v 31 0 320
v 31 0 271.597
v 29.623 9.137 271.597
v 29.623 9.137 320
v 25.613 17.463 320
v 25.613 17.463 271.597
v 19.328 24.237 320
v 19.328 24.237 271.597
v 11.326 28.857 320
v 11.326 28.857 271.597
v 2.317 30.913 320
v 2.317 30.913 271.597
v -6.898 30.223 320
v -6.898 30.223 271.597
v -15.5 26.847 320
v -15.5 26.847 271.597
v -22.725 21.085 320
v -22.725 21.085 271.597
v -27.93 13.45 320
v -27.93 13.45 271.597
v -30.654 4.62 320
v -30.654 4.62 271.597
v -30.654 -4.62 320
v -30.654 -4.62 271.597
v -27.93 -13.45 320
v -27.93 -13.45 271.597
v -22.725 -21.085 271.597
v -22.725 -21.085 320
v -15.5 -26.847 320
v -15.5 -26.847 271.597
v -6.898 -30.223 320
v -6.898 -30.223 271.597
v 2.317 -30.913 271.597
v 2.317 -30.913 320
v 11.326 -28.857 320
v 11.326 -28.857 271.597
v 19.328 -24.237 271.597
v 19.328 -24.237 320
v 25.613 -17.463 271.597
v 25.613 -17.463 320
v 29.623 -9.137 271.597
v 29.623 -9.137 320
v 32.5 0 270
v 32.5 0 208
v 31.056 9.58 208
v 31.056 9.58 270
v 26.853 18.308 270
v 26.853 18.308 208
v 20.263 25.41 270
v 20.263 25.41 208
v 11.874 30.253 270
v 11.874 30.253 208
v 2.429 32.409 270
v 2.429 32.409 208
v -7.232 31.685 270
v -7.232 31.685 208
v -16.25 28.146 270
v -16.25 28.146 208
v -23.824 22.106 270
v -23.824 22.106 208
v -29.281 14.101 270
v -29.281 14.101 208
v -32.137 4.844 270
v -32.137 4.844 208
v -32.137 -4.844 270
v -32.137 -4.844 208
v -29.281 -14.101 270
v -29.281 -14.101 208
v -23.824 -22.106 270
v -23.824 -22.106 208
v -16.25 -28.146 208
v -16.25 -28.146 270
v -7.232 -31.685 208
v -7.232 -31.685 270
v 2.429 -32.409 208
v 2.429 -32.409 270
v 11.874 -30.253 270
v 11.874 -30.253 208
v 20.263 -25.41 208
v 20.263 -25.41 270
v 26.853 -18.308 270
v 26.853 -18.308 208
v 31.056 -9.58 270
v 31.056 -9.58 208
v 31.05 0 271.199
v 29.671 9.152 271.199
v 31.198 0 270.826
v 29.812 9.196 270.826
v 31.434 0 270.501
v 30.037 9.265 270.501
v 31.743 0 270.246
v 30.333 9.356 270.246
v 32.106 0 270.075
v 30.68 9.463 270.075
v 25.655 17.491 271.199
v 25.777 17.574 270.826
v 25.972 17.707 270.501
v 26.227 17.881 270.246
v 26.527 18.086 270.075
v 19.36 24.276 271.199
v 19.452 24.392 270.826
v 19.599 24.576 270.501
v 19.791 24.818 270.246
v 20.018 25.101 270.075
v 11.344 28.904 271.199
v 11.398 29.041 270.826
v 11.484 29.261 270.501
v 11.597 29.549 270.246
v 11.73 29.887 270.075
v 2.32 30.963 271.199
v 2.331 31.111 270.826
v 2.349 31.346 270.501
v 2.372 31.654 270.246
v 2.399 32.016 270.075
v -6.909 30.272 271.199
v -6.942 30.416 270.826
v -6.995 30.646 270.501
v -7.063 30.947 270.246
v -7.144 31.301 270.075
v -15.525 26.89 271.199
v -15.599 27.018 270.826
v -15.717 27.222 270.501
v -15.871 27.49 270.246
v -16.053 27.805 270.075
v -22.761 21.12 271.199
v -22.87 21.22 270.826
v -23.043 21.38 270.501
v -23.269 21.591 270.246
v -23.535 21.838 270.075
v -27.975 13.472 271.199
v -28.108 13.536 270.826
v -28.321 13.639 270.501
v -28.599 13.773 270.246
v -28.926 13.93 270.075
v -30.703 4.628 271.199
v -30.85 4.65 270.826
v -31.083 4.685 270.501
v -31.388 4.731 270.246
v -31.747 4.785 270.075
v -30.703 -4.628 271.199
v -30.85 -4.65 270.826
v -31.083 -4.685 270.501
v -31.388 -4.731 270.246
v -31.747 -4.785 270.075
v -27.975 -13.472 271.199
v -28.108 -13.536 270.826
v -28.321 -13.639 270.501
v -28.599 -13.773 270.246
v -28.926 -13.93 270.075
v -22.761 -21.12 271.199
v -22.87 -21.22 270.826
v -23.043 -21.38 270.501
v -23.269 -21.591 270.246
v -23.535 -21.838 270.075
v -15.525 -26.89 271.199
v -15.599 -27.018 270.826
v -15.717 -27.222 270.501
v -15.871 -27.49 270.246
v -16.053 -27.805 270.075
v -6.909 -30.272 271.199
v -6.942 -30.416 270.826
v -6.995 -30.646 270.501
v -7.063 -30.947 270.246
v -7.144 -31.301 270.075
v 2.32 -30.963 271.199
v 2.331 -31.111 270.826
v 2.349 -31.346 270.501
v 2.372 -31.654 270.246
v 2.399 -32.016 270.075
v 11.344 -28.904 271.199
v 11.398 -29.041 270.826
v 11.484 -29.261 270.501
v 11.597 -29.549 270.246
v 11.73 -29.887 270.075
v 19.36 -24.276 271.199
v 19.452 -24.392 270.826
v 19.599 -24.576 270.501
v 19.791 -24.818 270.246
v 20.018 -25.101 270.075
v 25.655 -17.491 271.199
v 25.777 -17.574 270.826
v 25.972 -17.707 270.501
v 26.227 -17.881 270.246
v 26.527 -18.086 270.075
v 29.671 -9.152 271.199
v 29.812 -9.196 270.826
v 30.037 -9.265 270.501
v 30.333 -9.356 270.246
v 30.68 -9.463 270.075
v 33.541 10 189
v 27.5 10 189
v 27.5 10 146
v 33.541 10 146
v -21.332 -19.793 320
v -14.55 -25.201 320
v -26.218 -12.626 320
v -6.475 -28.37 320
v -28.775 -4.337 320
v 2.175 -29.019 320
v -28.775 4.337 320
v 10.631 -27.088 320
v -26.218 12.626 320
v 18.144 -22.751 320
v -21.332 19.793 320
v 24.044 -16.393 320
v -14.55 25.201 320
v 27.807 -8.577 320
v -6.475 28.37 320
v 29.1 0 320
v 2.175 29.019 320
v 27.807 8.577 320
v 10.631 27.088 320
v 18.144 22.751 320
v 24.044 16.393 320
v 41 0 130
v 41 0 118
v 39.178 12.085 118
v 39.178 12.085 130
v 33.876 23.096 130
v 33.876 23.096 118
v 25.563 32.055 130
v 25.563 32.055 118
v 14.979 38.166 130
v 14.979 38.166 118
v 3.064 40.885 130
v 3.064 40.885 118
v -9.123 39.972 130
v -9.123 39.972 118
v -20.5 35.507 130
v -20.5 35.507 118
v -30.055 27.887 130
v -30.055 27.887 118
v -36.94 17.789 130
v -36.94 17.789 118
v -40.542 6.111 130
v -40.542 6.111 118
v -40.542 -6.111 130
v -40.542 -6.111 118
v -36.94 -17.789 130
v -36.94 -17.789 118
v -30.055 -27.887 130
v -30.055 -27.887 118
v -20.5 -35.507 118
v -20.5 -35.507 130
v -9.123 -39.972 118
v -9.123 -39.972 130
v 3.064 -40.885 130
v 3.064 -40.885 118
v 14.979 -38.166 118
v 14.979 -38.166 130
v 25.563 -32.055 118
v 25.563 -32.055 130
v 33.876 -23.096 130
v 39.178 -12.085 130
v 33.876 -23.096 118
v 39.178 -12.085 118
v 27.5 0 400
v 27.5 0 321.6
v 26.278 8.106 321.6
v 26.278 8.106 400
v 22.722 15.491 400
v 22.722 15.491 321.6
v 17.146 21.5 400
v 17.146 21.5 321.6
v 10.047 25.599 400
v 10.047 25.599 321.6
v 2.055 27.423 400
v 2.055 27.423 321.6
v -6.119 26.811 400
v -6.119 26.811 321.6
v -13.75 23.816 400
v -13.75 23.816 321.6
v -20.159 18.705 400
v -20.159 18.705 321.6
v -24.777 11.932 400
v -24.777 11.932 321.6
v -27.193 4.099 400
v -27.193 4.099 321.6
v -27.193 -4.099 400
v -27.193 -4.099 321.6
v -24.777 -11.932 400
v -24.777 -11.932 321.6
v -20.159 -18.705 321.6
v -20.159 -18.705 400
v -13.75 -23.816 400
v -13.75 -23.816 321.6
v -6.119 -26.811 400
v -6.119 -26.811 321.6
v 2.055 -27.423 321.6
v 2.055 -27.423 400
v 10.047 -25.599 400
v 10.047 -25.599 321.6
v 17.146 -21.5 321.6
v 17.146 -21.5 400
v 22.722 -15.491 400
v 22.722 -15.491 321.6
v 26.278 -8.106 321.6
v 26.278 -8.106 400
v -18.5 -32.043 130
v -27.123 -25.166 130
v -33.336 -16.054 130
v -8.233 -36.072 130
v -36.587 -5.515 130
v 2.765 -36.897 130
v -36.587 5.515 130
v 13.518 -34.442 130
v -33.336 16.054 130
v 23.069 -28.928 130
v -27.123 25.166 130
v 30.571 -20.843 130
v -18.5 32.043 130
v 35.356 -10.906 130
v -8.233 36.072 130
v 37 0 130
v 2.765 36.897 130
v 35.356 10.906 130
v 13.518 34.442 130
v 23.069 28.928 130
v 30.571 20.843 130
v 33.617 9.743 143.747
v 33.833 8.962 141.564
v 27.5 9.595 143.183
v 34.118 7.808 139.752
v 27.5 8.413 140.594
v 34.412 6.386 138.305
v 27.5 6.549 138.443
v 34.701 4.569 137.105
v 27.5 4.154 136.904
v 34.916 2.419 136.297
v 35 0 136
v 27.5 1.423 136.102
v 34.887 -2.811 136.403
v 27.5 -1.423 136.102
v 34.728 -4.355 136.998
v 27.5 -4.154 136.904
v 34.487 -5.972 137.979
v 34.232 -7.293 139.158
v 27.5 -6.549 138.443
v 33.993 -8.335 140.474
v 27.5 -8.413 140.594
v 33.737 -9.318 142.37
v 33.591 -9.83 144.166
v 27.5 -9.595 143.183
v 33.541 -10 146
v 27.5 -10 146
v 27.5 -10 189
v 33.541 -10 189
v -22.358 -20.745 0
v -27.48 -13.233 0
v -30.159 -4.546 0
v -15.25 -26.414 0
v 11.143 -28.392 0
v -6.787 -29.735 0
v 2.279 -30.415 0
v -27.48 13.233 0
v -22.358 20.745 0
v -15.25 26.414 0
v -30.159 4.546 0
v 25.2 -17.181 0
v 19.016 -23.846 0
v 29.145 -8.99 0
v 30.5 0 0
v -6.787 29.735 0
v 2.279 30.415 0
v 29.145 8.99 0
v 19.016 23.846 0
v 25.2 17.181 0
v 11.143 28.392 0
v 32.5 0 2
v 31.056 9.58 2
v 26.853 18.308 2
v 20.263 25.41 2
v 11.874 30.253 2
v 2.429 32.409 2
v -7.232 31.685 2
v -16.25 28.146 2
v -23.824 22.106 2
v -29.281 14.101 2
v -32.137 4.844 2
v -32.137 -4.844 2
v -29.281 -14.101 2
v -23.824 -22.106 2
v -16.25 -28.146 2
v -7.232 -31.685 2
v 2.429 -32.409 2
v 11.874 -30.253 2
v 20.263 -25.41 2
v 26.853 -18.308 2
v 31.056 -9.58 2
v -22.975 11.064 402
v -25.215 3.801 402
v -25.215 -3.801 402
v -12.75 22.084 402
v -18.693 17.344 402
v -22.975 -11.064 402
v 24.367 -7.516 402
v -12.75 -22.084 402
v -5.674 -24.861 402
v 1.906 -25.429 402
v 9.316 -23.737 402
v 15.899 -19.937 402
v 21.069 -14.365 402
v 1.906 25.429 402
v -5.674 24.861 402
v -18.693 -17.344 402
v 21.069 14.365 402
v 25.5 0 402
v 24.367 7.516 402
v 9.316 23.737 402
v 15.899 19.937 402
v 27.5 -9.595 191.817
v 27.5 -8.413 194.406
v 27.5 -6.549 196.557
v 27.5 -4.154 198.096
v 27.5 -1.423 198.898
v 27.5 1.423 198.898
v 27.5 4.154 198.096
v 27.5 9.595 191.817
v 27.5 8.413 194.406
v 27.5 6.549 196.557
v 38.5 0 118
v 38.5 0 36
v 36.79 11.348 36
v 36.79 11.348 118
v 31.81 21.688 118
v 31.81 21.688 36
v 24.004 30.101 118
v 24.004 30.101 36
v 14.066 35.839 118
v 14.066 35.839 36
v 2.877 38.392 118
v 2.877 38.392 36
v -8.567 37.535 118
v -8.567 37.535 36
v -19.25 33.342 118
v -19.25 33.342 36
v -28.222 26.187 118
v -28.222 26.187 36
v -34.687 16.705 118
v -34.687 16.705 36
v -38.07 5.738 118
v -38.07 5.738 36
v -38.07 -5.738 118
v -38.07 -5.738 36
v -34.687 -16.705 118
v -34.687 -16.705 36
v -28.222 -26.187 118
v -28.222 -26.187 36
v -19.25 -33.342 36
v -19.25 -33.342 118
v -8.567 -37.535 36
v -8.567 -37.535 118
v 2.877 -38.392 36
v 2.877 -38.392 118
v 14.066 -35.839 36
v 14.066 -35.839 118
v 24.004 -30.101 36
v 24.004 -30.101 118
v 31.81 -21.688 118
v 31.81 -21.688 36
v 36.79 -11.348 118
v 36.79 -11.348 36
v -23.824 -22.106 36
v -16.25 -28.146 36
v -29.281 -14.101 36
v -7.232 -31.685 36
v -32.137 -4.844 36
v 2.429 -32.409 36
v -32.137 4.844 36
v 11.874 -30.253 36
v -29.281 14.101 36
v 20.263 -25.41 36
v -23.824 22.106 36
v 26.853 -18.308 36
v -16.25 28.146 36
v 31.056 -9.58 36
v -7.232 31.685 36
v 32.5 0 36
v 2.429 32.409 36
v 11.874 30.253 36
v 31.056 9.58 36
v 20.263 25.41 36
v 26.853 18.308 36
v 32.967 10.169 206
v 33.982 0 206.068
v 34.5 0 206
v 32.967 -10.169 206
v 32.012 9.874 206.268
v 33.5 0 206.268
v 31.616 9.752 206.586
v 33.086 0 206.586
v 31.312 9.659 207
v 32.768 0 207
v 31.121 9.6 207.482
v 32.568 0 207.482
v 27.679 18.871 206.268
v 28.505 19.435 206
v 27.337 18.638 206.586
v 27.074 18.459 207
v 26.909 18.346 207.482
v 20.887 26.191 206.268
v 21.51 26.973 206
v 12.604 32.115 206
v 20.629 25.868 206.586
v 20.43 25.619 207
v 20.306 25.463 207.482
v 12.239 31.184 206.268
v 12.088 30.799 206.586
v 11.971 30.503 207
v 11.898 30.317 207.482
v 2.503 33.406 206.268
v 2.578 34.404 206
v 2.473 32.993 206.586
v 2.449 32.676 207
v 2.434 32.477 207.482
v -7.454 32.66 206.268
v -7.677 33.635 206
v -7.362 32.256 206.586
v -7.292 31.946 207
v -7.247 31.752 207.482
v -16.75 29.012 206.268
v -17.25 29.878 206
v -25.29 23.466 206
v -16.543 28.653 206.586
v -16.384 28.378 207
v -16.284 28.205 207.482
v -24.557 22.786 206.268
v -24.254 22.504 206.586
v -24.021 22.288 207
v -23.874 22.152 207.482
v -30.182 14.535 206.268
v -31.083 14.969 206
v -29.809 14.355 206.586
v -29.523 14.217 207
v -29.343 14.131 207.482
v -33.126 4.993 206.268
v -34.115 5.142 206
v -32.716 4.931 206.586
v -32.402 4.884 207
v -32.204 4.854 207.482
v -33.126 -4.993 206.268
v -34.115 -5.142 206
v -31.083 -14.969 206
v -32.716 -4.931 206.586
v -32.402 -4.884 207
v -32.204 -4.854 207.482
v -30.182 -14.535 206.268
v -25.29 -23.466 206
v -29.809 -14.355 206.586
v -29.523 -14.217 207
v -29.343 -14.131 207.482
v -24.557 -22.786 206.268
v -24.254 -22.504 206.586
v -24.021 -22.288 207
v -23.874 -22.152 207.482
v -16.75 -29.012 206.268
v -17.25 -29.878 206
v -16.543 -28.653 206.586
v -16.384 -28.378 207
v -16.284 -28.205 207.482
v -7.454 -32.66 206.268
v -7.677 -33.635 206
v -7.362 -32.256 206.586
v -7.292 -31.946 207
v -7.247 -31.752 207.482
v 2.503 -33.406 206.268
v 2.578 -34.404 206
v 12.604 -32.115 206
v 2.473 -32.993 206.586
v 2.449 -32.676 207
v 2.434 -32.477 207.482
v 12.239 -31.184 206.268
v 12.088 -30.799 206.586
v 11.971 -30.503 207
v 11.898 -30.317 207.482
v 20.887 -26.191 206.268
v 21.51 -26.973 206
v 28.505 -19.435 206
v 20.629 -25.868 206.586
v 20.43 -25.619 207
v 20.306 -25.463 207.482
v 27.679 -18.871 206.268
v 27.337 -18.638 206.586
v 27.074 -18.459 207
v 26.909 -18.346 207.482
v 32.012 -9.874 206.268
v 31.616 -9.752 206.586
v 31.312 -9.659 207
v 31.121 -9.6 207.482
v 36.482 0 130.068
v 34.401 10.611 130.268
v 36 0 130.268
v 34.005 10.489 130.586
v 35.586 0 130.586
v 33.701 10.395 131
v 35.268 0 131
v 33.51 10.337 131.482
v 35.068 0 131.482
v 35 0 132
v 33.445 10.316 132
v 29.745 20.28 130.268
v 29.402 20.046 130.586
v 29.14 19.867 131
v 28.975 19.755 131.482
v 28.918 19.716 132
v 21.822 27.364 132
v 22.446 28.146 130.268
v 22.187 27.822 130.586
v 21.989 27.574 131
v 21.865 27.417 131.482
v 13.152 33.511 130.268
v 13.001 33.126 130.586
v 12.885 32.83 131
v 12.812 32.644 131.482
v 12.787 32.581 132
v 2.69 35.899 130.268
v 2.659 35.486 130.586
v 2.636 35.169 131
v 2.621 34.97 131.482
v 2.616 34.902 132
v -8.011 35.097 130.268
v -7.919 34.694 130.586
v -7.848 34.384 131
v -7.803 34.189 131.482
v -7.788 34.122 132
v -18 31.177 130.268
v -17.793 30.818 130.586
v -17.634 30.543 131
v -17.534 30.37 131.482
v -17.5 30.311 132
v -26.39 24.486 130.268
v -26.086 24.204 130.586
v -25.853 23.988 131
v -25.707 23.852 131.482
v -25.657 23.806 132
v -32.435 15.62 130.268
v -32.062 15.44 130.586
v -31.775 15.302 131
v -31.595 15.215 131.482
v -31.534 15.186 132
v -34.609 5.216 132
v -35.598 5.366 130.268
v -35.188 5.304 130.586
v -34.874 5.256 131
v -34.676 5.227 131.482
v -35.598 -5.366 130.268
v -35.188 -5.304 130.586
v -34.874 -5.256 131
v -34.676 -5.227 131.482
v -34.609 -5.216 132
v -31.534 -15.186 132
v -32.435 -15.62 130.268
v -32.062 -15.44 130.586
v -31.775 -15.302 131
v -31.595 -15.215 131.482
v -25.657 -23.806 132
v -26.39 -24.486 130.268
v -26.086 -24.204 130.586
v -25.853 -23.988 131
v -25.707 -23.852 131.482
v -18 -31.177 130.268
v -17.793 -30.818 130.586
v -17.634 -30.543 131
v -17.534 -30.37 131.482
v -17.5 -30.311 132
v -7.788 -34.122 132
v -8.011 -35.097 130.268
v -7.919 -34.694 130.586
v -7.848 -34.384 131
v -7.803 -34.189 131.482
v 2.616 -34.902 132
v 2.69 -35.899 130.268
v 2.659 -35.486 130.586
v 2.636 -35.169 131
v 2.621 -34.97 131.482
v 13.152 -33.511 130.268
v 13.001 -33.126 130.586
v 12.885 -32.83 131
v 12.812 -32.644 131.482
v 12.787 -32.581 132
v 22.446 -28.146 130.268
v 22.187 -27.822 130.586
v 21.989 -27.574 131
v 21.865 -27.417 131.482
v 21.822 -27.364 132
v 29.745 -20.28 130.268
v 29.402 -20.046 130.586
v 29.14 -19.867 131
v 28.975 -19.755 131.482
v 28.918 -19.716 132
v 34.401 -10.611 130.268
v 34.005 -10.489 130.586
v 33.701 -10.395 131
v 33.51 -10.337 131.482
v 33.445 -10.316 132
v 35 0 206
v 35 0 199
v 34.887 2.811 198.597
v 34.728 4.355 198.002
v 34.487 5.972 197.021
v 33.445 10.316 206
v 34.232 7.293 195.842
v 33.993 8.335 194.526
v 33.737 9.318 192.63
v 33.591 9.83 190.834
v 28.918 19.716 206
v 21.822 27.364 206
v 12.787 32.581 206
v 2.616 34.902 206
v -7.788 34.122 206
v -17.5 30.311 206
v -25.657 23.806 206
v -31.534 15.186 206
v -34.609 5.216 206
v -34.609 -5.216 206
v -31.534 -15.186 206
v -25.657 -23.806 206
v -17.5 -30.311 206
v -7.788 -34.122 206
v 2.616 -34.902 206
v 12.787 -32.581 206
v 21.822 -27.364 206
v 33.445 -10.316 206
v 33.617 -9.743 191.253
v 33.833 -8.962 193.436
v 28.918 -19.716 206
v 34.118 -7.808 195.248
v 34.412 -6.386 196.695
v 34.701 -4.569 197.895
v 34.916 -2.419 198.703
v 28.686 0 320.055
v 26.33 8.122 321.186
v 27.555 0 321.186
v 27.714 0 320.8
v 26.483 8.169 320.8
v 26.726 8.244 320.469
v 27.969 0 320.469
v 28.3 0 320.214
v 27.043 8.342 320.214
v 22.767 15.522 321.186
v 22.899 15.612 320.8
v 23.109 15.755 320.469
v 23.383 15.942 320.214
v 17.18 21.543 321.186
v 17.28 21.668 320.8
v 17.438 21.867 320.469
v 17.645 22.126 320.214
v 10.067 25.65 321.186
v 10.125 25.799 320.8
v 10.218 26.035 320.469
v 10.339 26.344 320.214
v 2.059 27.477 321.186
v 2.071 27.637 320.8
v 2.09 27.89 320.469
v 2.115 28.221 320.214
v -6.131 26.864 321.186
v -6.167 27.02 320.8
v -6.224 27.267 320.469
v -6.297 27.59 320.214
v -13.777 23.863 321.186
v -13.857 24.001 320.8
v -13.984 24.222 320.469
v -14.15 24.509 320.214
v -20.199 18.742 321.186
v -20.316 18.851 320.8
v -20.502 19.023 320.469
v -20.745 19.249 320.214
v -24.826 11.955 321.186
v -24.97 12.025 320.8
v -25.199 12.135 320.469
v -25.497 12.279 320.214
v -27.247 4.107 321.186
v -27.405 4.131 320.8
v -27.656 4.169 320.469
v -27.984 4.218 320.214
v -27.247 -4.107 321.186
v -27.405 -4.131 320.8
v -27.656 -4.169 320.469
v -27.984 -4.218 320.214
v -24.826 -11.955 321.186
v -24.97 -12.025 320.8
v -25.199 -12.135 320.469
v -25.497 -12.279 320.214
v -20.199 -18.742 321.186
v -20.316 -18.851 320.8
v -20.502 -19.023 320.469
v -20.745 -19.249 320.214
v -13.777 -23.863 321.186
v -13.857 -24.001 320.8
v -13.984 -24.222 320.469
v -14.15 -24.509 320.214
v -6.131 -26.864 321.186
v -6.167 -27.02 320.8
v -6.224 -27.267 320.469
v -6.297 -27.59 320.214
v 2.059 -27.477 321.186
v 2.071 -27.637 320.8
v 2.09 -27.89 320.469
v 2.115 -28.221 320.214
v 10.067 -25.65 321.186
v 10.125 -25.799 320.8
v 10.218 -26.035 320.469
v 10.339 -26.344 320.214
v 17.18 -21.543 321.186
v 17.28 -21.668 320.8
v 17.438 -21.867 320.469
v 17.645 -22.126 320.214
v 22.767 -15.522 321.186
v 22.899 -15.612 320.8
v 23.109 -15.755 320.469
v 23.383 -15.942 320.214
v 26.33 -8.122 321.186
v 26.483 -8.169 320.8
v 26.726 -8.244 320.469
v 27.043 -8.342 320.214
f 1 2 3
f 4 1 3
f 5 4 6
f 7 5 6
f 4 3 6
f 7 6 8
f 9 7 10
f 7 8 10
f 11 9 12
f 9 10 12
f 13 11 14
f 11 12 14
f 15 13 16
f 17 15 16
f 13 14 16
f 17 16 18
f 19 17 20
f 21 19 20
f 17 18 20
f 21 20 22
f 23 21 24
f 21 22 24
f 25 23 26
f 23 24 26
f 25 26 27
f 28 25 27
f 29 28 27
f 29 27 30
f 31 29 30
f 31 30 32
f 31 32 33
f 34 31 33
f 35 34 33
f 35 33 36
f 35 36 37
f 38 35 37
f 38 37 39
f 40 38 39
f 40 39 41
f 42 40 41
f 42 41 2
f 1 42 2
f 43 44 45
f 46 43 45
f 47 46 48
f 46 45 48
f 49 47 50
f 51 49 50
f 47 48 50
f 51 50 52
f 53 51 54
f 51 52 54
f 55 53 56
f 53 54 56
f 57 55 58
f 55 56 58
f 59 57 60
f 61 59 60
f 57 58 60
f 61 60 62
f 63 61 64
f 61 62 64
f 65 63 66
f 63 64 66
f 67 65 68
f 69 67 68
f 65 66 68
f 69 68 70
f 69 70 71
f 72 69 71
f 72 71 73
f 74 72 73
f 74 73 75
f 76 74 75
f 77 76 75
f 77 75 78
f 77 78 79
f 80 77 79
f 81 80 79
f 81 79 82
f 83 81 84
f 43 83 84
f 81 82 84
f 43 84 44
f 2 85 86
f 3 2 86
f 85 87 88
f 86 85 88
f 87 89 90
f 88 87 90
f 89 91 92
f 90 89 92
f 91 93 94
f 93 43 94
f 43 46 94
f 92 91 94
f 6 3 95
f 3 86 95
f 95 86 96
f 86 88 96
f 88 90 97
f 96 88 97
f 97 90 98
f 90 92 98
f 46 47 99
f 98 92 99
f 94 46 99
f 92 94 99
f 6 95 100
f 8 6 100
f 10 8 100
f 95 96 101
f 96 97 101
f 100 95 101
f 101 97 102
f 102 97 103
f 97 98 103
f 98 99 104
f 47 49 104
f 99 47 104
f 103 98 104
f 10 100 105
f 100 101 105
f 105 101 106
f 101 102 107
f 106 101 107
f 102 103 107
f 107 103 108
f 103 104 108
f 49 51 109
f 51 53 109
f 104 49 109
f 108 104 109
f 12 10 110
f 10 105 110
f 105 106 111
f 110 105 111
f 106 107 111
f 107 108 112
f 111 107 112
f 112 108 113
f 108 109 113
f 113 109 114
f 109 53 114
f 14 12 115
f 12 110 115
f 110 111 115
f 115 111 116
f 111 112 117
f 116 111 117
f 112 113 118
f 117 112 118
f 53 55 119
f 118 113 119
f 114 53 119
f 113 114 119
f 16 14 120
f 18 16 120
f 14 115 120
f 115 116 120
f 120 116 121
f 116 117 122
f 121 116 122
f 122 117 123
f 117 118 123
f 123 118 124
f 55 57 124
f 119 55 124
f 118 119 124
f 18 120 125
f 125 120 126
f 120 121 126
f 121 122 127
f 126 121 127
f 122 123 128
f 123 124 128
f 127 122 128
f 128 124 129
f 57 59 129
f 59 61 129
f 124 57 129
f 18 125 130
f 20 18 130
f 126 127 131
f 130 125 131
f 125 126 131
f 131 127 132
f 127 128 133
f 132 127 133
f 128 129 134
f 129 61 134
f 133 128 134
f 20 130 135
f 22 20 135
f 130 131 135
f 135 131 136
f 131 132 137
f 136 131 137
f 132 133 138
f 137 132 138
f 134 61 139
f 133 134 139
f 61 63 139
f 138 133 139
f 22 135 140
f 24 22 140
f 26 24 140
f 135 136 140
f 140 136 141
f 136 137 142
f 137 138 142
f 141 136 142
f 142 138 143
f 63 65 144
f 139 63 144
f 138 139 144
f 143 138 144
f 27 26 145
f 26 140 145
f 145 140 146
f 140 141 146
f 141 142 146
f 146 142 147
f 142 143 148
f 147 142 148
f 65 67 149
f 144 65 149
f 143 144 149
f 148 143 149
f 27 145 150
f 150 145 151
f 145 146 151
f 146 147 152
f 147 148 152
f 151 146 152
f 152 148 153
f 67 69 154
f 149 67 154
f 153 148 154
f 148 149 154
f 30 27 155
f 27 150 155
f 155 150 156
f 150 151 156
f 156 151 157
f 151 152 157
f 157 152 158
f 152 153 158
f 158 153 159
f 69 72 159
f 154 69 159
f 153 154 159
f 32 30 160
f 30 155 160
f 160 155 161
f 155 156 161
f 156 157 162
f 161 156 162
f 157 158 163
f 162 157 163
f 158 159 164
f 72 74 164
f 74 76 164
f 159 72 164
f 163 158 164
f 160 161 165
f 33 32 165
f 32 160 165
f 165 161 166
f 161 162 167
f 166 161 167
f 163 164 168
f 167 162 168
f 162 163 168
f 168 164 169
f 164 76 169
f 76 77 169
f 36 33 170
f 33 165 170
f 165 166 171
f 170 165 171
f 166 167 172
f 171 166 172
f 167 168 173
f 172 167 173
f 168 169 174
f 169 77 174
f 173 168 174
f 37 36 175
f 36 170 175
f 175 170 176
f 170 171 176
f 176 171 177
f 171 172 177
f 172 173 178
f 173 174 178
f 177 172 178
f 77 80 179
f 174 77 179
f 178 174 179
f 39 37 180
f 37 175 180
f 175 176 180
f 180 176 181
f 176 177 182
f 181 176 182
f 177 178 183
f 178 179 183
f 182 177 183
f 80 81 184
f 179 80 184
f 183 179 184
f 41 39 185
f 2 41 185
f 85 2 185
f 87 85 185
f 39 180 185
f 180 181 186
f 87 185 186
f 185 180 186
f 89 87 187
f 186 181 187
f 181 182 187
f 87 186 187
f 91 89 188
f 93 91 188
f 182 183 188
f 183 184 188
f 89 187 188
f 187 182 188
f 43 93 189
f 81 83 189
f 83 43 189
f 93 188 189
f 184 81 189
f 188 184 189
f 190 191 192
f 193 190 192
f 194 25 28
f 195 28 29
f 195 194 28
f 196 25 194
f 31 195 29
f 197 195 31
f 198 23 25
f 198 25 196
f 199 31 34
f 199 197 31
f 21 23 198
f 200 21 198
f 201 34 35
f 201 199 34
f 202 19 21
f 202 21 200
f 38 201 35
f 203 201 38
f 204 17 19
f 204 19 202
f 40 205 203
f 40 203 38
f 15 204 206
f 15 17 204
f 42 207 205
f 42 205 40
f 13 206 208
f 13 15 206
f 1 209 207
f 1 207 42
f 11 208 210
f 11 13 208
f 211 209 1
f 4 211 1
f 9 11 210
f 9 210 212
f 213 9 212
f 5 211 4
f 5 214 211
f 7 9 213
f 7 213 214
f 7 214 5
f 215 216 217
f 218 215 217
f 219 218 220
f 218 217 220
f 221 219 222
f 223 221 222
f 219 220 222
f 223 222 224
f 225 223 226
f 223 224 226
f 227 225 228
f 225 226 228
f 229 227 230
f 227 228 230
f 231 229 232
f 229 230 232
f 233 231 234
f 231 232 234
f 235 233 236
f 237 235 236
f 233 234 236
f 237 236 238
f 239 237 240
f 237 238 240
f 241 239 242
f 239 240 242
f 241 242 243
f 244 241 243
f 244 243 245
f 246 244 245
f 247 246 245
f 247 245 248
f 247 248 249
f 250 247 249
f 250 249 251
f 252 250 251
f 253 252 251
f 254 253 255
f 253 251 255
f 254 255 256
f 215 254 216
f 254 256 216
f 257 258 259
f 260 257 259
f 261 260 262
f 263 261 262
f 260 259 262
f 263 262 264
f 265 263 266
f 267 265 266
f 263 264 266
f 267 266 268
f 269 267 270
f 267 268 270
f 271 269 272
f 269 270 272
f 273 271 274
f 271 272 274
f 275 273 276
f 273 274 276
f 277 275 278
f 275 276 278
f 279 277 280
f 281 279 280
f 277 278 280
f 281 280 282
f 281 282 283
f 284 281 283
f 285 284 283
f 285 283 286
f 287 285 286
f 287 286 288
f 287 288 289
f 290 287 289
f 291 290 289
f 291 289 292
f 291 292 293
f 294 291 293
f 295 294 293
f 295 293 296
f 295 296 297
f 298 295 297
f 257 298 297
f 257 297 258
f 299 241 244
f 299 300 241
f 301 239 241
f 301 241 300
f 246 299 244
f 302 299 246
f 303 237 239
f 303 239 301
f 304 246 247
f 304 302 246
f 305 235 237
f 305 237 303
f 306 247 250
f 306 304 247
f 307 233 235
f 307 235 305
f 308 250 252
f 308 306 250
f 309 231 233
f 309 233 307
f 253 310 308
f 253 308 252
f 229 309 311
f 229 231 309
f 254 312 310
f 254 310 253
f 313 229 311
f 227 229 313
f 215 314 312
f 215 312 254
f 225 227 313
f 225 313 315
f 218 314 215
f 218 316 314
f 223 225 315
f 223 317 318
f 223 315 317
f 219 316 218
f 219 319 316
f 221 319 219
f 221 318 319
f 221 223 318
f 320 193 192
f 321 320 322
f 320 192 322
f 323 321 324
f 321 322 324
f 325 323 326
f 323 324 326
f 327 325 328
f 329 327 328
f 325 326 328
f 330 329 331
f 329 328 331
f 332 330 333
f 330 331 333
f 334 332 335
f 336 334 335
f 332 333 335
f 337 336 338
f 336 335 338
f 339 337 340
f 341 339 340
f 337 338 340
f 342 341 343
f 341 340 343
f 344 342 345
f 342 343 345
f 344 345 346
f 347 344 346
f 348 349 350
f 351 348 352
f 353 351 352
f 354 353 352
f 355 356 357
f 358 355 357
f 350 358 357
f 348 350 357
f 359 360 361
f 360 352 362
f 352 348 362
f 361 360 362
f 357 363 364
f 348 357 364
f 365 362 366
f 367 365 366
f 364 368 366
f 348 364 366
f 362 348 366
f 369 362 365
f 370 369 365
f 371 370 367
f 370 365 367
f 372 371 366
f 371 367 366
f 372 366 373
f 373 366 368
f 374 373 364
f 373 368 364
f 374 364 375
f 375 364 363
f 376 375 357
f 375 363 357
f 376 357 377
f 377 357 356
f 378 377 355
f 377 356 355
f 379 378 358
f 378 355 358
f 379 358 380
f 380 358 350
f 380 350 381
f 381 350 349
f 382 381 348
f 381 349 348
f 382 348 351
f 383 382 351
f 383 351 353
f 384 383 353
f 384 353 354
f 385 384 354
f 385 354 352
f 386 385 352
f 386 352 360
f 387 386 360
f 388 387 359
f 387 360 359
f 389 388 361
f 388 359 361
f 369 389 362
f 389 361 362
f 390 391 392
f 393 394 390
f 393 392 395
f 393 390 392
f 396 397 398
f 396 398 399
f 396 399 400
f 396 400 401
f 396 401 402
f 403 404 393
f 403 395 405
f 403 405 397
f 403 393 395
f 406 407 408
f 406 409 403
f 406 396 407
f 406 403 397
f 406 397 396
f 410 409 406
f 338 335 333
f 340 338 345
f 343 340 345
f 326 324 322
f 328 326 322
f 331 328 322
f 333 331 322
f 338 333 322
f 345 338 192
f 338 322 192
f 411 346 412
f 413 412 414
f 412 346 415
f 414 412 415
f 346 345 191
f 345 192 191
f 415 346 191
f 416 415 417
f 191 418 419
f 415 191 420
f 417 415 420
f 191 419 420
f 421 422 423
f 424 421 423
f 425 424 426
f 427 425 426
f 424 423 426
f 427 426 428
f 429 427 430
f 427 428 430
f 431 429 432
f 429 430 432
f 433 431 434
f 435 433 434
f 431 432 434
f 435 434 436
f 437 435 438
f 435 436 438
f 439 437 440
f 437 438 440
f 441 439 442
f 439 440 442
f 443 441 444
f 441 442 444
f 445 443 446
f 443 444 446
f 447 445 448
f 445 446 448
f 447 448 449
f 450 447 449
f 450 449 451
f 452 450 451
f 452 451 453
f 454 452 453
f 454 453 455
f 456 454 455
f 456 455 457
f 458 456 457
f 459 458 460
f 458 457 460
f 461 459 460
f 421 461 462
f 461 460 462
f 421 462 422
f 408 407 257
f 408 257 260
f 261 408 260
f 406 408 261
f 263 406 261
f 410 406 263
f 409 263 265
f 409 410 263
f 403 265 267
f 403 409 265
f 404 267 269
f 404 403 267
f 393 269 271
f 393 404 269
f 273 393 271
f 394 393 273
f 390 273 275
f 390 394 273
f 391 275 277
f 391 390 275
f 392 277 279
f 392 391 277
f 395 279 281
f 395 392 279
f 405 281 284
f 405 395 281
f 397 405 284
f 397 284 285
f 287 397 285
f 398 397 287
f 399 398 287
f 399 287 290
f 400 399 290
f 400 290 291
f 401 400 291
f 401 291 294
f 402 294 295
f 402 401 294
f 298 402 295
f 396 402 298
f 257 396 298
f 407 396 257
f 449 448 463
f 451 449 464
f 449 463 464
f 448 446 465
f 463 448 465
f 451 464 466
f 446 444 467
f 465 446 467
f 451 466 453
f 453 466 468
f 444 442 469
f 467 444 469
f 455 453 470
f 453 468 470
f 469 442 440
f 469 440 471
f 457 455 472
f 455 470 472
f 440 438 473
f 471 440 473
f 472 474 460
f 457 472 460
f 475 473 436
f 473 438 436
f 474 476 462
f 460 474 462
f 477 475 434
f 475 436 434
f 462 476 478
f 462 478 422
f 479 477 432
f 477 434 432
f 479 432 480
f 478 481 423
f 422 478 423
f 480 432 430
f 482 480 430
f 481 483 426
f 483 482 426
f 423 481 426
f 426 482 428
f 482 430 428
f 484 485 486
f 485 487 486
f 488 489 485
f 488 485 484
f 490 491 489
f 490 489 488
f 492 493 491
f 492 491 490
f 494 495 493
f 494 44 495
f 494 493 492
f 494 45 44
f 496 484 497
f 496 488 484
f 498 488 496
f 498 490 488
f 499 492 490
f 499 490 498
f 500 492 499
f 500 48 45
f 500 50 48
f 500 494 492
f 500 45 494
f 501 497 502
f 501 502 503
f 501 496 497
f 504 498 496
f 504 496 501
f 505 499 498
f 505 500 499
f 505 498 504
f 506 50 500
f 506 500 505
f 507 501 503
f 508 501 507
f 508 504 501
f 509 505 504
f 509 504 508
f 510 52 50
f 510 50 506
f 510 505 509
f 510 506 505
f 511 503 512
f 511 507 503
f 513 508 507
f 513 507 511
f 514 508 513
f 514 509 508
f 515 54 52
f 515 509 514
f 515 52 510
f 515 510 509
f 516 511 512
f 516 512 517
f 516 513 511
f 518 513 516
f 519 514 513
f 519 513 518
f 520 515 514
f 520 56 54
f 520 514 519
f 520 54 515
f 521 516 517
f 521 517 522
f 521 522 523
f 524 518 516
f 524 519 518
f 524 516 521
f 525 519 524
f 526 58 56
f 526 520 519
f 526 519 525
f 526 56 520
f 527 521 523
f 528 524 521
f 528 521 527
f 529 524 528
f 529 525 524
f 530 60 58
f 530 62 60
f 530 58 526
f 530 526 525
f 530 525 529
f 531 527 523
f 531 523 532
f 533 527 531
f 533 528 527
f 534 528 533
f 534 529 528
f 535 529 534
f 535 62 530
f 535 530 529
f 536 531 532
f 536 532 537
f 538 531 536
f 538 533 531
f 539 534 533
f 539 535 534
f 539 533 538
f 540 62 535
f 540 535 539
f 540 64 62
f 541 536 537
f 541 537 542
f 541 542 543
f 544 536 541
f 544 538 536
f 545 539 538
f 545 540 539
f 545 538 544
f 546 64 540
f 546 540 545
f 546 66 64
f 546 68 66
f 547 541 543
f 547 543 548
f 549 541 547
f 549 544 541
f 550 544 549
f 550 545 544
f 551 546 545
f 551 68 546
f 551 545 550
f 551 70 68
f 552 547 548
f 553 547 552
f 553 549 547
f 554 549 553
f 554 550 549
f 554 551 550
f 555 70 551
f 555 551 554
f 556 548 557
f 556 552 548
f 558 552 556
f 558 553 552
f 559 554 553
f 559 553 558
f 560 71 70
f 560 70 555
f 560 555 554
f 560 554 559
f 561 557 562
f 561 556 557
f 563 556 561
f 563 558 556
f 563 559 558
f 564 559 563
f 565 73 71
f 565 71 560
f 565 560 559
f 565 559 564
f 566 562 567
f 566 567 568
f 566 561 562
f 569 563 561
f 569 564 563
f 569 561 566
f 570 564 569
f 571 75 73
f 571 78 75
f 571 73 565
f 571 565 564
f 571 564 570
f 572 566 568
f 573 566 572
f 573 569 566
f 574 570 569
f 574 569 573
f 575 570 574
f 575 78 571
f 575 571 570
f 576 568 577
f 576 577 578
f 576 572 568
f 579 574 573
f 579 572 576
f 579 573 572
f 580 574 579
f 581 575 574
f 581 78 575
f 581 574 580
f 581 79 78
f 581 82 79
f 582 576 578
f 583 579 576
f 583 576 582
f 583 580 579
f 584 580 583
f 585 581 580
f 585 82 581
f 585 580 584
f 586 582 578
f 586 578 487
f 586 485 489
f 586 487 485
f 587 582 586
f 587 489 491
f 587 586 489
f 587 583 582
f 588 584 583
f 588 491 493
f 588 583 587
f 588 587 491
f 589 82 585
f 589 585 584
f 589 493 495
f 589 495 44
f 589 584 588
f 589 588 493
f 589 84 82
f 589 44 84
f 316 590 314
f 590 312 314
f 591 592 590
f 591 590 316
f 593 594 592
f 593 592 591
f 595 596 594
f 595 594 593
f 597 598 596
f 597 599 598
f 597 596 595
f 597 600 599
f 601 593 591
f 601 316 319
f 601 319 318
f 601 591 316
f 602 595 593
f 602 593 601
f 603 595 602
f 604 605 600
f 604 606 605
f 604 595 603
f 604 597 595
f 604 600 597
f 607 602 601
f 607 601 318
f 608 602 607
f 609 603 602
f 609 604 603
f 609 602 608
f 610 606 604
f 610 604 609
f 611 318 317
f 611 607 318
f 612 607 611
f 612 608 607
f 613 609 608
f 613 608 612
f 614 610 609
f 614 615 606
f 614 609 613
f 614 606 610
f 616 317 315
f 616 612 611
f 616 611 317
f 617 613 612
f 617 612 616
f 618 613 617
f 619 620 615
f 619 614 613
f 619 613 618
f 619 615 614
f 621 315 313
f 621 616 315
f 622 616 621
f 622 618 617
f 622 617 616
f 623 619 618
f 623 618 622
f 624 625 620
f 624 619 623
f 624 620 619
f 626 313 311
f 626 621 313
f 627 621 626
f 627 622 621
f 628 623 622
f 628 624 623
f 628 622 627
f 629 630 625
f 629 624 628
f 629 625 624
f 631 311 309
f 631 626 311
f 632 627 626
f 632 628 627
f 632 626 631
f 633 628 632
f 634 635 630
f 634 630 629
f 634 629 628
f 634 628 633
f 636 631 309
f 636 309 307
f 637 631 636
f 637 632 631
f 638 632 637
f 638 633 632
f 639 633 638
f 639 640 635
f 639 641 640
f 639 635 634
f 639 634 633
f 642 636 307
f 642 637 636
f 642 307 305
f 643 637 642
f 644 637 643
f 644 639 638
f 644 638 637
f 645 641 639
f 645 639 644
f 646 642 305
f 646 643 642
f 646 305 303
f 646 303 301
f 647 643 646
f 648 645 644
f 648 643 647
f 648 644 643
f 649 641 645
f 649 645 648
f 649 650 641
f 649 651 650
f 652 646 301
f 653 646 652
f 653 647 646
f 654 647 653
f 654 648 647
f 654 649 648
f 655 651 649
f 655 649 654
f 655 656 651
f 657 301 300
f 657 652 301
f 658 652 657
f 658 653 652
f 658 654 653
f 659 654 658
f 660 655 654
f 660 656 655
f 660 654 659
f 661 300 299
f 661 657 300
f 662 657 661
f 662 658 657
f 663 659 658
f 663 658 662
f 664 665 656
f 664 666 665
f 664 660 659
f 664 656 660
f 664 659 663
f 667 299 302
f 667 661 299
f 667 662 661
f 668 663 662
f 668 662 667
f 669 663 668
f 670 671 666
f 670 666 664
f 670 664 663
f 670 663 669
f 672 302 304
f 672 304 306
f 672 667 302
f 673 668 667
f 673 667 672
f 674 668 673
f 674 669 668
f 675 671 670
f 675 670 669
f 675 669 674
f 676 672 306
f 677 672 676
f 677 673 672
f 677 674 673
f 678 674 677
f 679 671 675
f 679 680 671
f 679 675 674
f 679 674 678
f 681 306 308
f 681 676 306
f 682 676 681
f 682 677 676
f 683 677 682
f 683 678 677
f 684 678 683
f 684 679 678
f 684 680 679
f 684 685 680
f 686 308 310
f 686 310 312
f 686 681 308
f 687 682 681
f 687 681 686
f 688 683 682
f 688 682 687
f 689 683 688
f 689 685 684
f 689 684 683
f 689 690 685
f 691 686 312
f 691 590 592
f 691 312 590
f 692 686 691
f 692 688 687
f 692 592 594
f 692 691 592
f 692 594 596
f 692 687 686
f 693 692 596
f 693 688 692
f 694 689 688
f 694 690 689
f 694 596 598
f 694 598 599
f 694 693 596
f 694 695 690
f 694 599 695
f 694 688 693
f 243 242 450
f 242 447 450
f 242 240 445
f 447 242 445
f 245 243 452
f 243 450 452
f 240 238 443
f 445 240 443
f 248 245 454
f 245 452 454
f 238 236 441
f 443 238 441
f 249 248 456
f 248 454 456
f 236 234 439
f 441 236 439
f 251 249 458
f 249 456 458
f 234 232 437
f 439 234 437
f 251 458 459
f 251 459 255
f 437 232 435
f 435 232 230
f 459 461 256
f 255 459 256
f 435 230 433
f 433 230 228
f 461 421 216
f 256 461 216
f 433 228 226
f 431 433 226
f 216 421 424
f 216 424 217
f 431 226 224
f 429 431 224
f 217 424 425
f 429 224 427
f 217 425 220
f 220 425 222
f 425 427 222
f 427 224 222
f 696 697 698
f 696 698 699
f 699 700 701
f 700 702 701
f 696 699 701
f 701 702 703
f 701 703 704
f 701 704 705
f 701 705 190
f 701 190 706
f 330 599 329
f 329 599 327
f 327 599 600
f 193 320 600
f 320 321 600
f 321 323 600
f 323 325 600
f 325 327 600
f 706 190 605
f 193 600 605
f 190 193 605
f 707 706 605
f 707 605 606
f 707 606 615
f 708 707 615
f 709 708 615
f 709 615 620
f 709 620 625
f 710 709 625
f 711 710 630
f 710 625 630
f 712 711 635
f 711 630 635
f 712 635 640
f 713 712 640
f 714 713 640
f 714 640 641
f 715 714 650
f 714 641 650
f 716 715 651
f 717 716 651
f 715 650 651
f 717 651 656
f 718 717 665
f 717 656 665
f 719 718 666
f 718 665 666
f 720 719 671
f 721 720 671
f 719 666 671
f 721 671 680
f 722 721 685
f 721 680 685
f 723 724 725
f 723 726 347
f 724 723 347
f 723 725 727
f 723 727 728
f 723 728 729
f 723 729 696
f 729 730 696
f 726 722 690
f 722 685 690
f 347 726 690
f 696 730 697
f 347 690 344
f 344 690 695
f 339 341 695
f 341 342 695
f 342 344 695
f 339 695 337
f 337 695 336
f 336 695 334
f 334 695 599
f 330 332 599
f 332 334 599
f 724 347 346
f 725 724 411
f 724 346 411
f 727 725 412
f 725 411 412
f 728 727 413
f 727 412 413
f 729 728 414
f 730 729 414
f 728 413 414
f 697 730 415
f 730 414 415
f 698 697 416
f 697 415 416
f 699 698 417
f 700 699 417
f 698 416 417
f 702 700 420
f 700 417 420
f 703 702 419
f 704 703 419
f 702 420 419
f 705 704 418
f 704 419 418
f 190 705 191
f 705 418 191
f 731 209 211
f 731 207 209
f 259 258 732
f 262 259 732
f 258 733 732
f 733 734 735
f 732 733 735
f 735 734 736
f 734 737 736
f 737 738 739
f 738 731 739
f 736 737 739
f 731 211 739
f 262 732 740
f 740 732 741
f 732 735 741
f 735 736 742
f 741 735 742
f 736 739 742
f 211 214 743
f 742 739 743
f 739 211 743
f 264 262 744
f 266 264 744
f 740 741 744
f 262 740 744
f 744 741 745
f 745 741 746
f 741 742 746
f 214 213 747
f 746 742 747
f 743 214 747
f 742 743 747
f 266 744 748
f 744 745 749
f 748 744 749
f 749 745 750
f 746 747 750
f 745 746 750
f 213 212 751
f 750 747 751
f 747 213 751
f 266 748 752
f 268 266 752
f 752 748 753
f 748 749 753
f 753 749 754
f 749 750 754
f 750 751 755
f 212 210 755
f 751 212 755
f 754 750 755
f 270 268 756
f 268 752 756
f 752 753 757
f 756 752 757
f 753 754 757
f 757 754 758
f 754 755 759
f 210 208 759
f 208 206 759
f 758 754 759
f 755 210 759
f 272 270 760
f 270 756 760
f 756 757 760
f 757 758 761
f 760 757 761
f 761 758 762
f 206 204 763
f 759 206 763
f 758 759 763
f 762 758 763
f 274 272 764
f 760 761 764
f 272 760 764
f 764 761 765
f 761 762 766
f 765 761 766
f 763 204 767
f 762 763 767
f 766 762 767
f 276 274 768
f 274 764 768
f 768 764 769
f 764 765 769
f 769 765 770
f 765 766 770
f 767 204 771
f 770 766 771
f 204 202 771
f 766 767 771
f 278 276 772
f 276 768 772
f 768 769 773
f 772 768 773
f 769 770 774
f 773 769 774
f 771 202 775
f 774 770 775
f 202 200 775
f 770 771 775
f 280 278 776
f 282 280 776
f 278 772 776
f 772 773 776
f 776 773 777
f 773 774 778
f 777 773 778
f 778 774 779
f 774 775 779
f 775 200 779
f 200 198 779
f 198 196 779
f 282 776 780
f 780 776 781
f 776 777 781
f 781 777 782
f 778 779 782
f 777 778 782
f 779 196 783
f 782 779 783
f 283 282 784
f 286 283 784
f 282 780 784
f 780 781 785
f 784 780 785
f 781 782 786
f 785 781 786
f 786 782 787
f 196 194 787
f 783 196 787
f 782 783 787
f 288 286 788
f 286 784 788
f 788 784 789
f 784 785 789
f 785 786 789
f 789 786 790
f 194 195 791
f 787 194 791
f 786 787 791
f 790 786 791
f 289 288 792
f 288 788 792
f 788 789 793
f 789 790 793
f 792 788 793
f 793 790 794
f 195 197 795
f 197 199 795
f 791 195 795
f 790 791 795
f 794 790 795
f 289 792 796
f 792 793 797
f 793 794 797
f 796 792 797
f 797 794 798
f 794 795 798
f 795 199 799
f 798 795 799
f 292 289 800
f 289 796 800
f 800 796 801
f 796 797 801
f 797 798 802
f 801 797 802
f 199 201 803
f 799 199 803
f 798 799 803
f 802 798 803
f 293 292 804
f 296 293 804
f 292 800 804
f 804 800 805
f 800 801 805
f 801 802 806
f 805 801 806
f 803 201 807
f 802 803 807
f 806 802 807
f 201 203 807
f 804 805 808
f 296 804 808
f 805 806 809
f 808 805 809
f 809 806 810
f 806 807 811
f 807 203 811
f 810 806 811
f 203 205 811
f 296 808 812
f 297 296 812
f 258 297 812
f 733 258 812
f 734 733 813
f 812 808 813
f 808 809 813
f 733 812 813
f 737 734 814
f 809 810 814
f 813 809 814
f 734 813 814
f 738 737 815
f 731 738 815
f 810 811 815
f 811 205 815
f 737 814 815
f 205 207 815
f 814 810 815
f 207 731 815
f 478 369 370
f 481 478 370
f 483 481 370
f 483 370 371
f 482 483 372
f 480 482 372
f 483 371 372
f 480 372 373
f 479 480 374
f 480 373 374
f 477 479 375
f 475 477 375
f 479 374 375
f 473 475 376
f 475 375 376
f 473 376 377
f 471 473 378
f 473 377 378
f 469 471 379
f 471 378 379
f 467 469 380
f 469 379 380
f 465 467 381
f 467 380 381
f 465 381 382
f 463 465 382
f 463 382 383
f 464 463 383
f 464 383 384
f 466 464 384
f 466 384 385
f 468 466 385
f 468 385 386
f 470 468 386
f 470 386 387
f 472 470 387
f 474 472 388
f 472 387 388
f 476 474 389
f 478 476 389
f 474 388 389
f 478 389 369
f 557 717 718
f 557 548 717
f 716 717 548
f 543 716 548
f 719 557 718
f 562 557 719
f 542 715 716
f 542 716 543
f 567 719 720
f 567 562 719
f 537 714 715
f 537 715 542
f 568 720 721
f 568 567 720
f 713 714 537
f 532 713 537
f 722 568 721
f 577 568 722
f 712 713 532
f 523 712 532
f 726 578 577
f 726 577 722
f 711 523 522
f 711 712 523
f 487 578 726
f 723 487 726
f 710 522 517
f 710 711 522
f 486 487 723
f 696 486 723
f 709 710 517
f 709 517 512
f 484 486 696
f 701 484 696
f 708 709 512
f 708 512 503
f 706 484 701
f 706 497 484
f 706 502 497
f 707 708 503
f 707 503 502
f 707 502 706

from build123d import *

# Parameters (mm, degrees)
SKETCH_1_R          = 32.5
EXTRUDE_1_DEPTH     = 36
SKETCH_2_R          = 38.5
EXTRUDE_2_DEPTH     = 82
SKETCH_3_R          = 41
EXTRUDE_3_DEPTH     = 12
SKETCH_4_R          = 35
EXTRUDE_4_DEPTH     = 76
SKETCH_5_R          = 32.5
EXTRUDE_5_DEPTH     = 64
SKETCH_6_R          = 31
EXTRUDE_6_DEPTH     = 50
SKETCH_7_R          = 27.5
EXTRUDE_7_DEPTH     = 82
FILLET_1_R          = 2
FILLET_2_R          = 1.6
CHAMFER_1_SIZE      = 2
CUT_EXTRUDE_1_DEPTH = 29


with BuildPart() as part:
    # 草图1 → 凸台-拉伸1 (new body)
    with BuildSketch(Plane.XY):
        Circle(SKETCH_1_R)
    extrude(amount=EXTRUDE_1_DEPTH)

    # 草图2 → 凸台-拉伸2 (add)
    with BuildSketch(Plane.XY.offset(36)):
        Circle(SKETCH_2_R)
    extrude(amount=EXTRUDE_2_DEPTH)

    # 草图3 → 凸台-拉伸3 (add)
    with BuildSketch(Plane.XY.offset(118)):
        Circle(SKETCH_3_R)
    extrude(amount=EXTRUDE_3_DEPTH)

    # 草图4 → 凸台-拉伸4 (add)
    with BuildSketch(Plane.XY.offset(130)):
        Circle(SKETCH_4_R)
    extrude(amount=EXTRUDE_4_DEPTH)

    # 草图5 → 凸台-拉伸5 (add)
    with BuildSketch(Plane.XY.offset(206)):
        Circle(SKETCH_5_R)
    extrude(amount=EXTRUDE_5_DEPTH)

    # 草图6 → 凸台-拉伸6 (add)
    with BuildSketch(Plane.XY.offset(270)):
        Circle(SKETCH_6_R)
    extrude(amount=EXTRUDE_6_DEPTH)

    # 草图7 → 凸台-拉伸7 (add)
    with BuildSketch(Plane.XY.offset(320)):
        Circle(SKETCH_7_R)
    extrude(amount=EXTRUDE_7_DEPTH)

    # 圆角1
    fillet_1_edges = [part.edges().sort_by_distance(p)[0] for p in [
        (-35, 0, 130),
        (-32.5, 0, 206),
    ]]
    fillet(fillet_1_edges, radius=FILLET_1_R)

    # 圆角2
    # the kernel refuses this fillet: 1.6 mm, written as the material it adds along each edge
    with BuildSketch(Plane(origin=(0, 0, 270), x_dir=(1, 0, 0), z_dir=(0, -1, 0))) as fillet_2_piece_1:
        with BuildLine():
            CenterArc((32.6, 1.596871942), FILLET_2_R, 180, 86.416678302)
            Line((31, 1.596871942), (30.968, 1.596871942))
            Line((30.968, 1.596871942), (30.968, 0))
            Line((30.968, 0), (31, -0.032))
            ThreePointArc((31, -0.032), (31.75, -0.032), (32.498, -0.031937439))
            Line((32.498, -0.031937439), (32.5, 0))
        make_face()
    revolve(axis=Axis((0, 0, 270), (0, 0, 1)))
    with BuildSketch(Plane(origin=(0, 0, 320), x_dir=(1, 0, 0), z_dir=(0, -1, 0))) as fillet_2_piece_2:
        with BuildLine():
            CenterArc((27.5 + FILLET_2_R, FILLET_2_R), FILLET_2_R, 180, 90)
            Line((27.5, FILLET_2_R), (27.5 - FILLET_2_R * 0.02, FILLET_2_R))
            Line((27.5 - FILLET_2_R * 0.02, FILLET_2_R), (27.5 - FILLET_2_R * 0.02, -FILLET_2_R * 0.02))
            Line((27.5 - FILLET_2_R * 0.02, -FILLET_2_R * 0.02), (27.5 + FILLET_2_R, -FILLET_2_R * 0.02))
            Line((27.5 + FILLET_2_R, -FILLET_2_R * 0.02), (27.5 + FILLET_2_R, 0))
        make_face()
    revolve(axis=Axis((0, 0, 320), (0, 0, 1)))

    # 倒角1
    chamfer_1_edges = [part.edges().sort_by_distance(p)[0] for p in [
        (-32.5, 0, 0),
        (-27.5, 0, 402),
    ]]
    chamfer(chamfer_1_edges, length=CHAMFER_1_SIZE)

    # 草图8 → 切除-拉伸1 (cut)
    with BuildSketch(Plane(origin=(27.5, 0, 0), x_dir=(0, 0, -1), z_dir=(1, 0, 0))):
        with BuildLine():
            Line((-189, 10), (-146, 10))
            ThreePointArc((-146, 10), (-136, 0), (-146, -10))
            Line((-146, -10), (-189, -10))
            ThreePointArc((-189, -10), (-199, 0), (-189, 10))
        make_face()
    extrude(amount=CUT_EXTRUDE_1_DEPTH, mode=Mode.SUBTRACT)


solid = part.part
